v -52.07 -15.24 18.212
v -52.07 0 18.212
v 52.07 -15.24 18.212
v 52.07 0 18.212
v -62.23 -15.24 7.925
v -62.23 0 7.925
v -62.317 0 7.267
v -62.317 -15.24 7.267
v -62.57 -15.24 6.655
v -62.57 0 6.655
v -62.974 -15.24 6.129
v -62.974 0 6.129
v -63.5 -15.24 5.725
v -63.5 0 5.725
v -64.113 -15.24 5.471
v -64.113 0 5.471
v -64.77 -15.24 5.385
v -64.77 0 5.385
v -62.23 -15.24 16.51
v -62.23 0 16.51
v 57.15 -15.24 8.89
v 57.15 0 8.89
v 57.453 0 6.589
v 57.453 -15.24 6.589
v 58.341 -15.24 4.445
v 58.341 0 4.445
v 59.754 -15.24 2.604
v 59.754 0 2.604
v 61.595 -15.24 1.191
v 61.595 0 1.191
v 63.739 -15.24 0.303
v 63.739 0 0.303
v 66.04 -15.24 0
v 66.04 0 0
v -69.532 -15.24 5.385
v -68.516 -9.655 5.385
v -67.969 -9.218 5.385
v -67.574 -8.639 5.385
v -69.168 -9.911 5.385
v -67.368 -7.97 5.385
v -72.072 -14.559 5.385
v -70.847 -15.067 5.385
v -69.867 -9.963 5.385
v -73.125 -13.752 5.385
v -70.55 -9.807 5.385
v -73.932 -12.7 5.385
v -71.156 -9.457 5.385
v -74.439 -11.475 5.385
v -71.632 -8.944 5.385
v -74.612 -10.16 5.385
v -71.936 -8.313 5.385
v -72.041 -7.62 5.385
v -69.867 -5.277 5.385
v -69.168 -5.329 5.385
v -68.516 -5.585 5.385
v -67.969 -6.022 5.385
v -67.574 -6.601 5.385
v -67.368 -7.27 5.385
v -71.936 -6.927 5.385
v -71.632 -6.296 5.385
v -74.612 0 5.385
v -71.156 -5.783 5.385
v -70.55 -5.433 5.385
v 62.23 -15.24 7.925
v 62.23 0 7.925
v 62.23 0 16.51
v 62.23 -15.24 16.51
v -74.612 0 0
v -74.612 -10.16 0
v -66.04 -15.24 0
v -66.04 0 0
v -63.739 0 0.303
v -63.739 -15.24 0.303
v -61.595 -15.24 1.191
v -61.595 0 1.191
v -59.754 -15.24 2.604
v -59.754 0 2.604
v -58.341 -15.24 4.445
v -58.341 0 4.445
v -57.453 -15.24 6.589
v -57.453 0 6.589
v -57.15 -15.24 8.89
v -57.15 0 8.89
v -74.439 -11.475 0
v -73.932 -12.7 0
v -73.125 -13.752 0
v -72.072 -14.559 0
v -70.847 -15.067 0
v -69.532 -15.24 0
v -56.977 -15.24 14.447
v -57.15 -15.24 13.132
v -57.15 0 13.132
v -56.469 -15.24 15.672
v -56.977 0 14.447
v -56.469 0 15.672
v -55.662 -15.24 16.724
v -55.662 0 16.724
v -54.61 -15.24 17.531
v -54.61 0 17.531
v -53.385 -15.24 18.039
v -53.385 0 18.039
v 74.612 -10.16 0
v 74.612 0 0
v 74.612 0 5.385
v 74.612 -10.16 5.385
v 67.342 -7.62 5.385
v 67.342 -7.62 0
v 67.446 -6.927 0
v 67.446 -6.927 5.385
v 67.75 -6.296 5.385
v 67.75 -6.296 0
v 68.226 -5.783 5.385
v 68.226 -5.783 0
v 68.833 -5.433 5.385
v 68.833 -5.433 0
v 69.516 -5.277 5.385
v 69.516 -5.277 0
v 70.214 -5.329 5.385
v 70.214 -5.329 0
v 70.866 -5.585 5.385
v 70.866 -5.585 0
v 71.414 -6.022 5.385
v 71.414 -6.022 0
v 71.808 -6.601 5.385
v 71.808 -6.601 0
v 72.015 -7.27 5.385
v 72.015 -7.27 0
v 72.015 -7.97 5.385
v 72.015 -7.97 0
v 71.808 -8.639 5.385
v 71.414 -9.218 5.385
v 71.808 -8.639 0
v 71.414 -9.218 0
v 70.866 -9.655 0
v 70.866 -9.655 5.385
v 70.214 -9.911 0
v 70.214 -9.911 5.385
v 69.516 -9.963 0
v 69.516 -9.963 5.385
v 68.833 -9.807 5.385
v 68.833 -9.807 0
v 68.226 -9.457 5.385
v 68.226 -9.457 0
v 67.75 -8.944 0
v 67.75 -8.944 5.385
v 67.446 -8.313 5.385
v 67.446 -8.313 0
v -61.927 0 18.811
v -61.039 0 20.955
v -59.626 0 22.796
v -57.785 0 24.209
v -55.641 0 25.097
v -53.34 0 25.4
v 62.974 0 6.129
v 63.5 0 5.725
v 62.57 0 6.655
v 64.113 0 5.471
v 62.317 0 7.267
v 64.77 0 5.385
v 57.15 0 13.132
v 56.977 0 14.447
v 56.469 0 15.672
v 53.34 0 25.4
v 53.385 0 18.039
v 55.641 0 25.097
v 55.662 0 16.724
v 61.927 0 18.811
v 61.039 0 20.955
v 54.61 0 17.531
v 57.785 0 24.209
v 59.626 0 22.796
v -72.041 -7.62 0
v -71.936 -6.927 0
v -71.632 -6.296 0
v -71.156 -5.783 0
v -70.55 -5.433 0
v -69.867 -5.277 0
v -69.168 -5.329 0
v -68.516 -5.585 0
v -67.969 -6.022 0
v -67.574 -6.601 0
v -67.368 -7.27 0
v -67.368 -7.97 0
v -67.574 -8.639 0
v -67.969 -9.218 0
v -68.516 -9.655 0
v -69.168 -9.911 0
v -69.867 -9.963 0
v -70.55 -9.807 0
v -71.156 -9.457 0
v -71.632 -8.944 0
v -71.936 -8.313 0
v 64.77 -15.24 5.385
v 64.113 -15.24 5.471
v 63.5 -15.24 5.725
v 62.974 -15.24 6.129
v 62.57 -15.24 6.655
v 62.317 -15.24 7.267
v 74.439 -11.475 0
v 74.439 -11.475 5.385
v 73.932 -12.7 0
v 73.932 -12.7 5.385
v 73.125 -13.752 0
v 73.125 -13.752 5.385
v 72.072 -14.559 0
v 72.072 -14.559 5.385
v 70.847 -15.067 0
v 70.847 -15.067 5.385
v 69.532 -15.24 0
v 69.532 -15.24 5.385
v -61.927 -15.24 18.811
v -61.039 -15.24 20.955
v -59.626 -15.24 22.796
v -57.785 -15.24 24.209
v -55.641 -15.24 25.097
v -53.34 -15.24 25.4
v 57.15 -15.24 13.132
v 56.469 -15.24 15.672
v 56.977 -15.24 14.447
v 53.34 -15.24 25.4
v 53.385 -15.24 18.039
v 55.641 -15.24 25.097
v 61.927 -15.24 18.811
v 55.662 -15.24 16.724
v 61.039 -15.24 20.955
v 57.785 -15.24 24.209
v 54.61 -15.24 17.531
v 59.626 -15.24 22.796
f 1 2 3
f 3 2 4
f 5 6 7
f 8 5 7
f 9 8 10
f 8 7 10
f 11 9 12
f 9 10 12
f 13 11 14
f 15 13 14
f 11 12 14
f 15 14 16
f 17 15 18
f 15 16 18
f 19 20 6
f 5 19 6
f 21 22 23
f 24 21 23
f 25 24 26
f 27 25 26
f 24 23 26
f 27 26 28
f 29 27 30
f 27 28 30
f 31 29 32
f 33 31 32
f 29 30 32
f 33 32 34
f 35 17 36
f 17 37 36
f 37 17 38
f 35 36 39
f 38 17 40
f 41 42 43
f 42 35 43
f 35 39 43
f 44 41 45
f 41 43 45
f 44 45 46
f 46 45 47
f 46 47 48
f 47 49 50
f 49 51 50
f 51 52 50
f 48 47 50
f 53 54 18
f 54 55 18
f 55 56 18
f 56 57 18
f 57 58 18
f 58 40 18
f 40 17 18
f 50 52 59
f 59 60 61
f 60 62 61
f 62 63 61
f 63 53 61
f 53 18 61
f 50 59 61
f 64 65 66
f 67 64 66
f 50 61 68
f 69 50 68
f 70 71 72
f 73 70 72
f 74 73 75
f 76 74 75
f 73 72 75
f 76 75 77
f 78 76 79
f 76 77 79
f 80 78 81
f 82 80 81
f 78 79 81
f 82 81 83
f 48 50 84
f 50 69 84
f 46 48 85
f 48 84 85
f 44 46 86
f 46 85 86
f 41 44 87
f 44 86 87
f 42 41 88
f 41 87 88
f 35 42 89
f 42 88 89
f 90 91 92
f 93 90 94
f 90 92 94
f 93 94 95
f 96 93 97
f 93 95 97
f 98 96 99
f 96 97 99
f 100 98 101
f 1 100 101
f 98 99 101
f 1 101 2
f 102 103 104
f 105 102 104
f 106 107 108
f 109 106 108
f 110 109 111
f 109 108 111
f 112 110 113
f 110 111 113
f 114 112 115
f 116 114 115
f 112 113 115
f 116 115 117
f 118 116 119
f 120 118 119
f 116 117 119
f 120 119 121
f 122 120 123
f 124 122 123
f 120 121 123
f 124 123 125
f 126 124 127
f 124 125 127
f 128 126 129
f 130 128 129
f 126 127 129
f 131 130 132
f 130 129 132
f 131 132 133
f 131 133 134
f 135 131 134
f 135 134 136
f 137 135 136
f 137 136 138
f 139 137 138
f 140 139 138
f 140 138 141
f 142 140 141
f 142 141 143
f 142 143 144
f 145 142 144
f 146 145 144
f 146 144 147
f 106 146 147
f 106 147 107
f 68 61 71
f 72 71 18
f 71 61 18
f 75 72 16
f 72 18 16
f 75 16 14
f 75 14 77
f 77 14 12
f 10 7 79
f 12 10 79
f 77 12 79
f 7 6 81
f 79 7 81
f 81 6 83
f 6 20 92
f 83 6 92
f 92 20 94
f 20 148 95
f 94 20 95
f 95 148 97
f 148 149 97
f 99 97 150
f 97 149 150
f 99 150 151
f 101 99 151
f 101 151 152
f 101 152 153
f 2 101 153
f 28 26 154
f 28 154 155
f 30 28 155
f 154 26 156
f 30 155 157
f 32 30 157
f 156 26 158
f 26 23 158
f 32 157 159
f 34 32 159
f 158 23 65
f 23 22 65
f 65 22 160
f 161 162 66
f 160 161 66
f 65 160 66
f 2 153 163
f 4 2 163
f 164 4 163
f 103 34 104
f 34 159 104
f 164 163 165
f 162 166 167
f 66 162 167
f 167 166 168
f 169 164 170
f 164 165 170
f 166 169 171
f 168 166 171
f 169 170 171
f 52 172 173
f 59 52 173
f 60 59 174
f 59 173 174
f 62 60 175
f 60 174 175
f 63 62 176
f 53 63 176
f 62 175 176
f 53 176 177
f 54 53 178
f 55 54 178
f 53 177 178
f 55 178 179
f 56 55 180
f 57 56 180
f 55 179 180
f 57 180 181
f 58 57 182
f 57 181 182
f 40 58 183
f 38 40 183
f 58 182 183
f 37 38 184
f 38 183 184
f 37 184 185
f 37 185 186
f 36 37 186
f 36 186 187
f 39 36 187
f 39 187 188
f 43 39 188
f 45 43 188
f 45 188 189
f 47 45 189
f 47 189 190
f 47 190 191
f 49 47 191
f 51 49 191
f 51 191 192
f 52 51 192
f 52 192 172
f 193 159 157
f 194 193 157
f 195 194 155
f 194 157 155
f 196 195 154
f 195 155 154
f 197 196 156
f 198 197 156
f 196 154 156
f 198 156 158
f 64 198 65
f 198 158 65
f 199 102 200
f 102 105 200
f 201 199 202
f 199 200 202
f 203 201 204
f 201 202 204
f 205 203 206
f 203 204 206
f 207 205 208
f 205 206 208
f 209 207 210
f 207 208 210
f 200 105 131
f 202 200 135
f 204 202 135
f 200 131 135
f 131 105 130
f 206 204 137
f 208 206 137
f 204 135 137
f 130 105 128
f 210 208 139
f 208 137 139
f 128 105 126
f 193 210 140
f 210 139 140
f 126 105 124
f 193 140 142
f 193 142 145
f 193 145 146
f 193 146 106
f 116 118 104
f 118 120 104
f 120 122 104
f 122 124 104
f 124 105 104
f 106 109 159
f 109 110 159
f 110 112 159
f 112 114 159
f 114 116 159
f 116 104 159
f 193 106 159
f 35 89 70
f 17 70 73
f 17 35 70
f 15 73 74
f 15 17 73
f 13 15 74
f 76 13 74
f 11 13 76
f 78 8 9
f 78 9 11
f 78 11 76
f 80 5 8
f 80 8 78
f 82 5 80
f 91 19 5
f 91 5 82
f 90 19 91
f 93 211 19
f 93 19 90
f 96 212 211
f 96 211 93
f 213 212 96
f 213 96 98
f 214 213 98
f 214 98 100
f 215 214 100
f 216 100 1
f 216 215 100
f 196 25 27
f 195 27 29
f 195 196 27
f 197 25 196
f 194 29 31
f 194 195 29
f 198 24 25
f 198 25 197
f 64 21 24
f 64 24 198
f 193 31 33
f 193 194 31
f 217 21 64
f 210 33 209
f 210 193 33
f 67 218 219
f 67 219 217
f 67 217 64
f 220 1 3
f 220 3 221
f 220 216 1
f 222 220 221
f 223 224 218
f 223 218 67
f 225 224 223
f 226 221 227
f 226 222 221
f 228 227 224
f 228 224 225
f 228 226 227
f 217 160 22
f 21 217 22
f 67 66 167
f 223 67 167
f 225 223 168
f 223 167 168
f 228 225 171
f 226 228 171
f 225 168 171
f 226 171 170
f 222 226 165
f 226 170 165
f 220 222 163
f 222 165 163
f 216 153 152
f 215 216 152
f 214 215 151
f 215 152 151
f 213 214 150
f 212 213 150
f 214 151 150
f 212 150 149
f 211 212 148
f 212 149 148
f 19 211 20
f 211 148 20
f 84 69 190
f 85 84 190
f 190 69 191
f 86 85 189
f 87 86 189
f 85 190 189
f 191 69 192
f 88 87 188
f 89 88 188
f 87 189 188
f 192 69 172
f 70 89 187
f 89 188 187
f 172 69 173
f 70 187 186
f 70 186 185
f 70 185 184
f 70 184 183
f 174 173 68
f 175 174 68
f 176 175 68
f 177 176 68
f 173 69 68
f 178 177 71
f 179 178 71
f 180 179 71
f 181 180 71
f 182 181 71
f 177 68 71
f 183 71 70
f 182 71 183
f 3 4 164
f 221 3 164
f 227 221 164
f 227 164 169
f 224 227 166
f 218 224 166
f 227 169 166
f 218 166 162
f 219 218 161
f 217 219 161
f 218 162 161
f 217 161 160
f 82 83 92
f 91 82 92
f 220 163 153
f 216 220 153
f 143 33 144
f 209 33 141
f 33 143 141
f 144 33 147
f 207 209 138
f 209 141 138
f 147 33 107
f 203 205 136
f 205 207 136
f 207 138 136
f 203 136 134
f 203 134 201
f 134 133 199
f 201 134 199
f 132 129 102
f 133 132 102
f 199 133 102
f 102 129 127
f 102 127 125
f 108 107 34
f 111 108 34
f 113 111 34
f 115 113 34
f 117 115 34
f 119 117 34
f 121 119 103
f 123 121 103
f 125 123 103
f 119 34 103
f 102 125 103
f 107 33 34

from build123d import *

# Parameters (mm, degrees)
F1_DEPTH = 15.24
F2_R     = 5.08
F5_D     = 4.699


with BuildPart() as f1:
    # F0 (on Front) → F1 (new body)
    with BuildSketch(Plane.XZ):
        with BuildLine():
            Line((53.34, 25.4), (-53.34, 25.4))
            ThreePointArc((-53.34, 25.4), (-59.626179, 22.796179), (-62.23, 16.51))
            Line((-62.23, 16.51), (-62.23, 7.9248))
            ThreePointArc((-62.23, 7.9248), (-62.973949, 6.128749), (-64.77, 5.3848))
            Line((-64.77, 5.3848), (-74.6125, 5.3848))
            Line((-74.6125, 5.3848), (-74.6125, 0))
            Line((-74.6125, 0), (-66.04, 0))
            ThreePointArc((-66.04, 0), (-59.753821, 2.603821), (-57.15, 8.89))
            Line((-57.15, 8.89), (-57.15, 13.1318))
            ThreePointArc((-57.15, 13.1318), (-55.662102, 16.723902), (-52.07, 18.2118))
            Line((-52.07, 18.2118), (52.07, 18.2118))
            ThreePointArc((52.07, 18.2118), (55.662102, 16.723902), (57.15, 13.1318))
            Line((57.15, 13.1318), (57.15, 8.89))
            ThreePointArc((57.15, 8.89), (59.753821, 2.603821), (66.04, 0))
            Line((66.04, 0), (74.6125, 0))
            Line((74.6125, 0), (74.6125, 5.3848))
            Line((74.6125, 5.3848), (64.77, 5.3848))
            ThreePointArc((64.77, 5.3848), (62.973949, 6.128749), (62.23, 7.9248))
            Line((62.23, 7.9248), (62.23, 16.51))
            ThreePointArc((62.23, 16.51), (59.626179, 22.796179), (53.34, 25.4))
        make_face()
    extrude(amount=F1_DEPTH)

    # F2
    f2_edges = [f1.edges().sort_by_distance(p)[0] for p in [
        (-74.6125, -15.24, 2.6924),
        (74.6125, -15.24, 2.6924),
    ]]
    fillet(f2_edges, radius=F2_R)

    # F5 (through all)
    with Locations(Plane.XY.offset(5.3848)):
        with Locations((-69.69125, -7.62), (69.69125, -7.62)):
            Hole(F5_D / 2)


solid = f1.part
